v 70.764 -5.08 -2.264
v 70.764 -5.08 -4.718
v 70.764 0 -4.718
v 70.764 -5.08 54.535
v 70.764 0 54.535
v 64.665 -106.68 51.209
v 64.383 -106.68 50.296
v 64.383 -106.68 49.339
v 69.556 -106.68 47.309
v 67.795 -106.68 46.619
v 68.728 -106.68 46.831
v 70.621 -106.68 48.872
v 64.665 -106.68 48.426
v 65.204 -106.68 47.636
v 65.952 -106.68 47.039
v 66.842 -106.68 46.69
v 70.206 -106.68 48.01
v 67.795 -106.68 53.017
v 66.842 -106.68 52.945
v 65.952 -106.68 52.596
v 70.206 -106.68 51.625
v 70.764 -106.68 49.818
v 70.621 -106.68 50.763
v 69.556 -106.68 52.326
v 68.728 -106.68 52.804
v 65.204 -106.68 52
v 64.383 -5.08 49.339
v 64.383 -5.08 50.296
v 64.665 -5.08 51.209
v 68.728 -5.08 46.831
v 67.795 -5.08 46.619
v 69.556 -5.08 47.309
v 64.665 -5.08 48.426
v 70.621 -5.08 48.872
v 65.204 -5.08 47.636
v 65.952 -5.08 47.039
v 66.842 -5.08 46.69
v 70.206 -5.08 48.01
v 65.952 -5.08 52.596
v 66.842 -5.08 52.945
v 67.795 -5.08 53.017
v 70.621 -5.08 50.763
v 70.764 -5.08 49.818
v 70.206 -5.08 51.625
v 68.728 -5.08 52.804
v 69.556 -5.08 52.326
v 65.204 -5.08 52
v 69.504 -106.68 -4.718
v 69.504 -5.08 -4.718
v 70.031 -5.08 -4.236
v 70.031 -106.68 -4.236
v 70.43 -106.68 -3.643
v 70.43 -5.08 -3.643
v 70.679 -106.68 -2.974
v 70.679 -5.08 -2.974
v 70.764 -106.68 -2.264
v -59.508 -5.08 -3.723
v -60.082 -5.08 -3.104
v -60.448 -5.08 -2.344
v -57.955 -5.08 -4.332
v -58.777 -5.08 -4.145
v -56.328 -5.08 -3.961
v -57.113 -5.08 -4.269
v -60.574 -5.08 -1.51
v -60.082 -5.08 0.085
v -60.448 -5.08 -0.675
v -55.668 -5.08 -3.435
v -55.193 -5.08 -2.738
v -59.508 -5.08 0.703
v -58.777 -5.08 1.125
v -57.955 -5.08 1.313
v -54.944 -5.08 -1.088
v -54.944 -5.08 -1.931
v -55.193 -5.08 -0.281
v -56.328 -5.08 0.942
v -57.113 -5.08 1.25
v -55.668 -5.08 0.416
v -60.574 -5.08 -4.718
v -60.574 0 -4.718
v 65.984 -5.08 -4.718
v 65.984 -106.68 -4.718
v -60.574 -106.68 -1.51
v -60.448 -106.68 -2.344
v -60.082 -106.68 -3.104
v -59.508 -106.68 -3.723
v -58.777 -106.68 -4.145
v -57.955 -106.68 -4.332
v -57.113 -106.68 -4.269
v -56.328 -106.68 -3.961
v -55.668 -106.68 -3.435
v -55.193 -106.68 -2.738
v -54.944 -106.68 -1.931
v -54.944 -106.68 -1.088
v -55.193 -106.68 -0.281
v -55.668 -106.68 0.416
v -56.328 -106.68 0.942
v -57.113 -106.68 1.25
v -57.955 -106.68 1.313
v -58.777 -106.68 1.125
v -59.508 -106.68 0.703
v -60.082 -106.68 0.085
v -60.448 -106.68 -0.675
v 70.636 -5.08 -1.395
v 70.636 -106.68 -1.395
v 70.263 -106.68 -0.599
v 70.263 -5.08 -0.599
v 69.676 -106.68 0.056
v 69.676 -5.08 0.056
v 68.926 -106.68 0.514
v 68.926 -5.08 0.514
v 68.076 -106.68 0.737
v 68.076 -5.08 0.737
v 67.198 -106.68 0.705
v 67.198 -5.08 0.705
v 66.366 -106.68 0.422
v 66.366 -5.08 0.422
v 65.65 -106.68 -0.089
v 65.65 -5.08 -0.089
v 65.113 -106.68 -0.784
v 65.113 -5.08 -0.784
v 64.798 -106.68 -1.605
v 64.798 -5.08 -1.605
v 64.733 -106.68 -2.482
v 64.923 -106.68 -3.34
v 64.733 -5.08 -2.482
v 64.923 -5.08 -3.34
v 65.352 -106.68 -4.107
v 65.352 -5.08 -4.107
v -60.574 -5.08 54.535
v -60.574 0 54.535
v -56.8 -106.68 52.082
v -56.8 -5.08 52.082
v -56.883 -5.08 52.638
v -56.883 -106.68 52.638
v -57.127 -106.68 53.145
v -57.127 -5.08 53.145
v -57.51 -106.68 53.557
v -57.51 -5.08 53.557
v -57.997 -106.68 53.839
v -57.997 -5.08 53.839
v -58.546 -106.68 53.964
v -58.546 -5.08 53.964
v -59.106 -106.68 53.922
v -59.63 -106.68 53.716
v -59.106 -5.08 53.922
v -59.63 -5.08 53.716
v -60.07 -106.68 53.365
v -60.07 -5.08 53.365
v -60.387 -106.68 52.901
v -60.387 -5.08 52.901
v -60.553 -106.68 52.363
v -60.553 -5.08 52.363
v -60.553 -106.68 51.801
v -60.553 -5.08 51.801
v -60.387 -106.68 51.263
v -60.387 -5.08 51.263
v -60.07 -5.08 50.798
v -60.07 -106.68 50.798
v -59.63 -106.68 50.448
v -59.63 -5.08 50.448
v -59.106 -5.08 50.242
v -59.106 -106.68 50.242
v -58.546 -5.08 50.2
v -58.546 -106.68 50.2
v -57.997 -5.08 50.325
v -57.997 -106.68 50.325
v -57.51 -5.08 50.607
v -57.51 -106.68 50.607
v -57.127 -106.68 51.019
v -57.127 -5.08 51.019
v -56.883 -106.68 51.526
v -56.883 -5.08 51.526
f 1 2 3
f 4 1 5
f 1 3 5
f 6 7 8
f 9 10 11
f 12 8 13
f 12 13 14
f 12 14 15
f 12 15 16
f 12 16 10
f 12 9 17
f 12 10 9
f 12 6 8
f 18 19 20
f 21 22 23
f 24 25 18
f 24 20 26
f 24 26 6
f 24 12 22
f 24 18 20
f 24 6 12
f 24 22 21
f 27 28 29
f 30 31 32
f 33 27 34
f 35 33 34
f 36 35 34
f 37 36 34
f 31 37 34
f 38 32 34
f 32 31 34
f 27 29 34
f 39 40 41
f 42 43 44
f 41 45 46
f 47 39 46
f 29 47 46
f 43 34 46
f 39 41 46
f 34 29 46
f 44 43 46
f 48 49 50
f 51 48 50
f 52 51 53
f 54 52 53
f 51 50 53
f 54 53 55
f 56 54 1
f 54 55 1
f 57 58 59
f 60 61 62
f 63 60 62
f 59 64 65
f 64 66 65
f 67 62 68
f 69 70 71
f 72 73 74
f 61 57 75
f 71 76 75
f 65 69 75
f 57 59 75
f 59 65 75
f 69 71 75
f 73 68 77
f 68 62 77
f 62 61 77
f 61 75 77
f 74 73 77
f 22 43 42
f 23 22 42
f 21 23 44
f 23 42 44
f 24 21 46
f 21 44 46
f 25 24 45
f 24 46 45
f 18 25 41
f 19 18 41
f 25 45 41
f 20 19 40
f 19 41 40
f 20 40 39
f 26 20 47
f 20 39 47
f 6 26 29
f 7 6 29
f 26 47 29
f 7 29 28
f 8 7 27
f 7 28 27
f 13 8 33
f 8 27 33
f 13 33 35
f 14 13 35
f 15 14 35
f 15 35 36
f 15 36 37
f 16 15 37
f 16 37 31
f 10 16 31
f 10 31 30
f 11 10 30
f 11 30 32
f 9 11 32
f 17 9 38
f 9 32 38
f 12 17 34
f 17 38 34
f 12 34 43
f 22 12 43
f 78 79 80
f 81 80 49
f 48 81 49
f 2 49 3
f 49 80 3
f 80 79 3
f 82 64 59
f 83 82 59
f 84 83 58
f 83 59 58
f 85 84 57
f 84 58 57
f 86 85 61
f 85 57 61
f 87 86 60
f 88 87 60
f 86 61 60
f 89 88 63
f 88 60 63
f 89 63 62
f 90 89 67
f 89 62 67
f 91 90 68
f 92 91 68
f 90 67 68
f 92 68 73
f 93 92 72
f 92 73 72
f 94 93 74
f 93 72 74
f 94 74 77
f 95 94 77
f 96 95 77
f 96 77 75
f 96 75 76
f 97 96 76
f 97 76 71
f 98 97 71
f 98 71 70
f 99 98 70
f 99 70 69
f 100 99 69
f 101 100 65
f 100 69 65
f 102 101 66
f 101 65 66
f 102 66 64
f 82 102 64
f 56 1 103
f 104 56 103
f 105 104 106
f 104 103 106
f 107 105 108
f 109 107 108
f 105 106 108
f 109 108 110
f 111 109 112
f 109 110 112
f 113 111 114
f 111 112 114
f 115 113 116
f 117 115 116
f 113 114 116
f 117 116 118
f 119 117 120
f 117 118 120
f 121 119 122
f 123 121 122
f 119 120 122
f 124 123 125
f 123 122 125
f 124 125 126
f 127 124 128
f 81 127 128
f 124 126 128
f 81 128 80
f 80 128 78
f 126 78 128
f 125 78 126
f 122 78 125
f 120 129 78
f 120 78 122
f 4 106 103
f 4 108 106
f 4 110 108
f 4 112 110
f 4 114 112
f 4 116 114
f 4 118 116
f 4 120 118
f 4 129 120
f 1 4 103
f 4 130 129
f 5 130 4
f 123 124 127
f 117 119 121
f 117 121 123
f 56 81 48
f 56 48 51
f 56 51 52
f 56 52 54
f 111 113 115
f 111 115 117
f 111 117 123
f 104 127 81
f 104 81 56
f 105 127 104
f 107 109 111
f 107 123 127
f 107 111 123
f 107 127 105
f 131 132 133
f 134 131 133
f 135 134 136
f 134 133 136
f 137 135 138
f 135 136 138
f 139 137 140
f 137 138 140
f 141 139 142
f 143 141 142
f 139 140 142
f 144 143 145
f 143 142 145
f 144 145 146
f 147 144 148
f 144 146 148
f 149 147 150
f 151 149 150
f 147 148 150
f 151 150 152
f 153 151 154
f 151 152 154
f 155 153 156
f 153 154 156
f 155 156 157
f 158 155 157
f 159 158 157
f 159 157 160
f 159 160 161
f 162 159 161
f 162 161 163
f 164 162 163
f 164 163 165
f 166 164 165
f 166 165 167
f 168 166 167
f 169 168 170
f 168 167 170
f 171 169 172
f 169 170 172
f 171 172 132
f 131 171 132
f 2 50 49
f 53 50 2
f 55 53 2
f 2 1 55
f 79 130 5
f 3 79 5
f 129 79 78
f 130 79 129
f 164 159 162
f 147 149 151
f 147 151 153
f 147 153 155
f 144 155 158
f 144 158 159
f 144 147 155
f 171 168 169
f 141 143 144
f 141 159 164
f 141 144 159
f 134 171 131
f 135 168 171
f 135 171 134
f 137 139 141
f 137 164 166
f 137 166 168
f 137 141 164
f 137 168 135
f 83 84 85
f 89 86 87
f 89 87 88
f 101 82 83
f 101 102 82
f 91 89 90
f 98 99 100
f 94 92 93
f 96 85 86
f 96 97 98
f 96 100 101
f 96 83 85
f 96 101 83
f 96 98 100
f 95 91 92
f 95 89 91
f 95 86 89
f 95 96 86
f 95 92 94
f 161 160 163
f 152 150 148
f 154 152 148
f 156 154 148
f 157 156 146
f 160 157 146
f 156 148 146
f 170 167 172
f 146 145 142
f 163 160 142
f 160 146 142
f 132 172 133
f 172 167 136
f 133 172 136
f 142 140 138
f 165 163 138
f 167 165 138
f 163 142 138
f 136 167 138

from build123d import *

# Parameters (mm, degrees)
F0_W     = 131.3371732831
F0_H     = 59.2526914552
F1_DEPTH = 5.08
F3_DEPTH = 101.6
F2_R     = 3.2079517841


with BuildPart() as f1:
    # F0 (on Front) → F1 (new body)
    with BuildSketch(Plane.XZ):
        with Locations((5.0949789584, 24.908774998)):
            Rectangle(F0_W, F0_H)
    extrude(amount=F1_DEPTH)

    # F2 (on face) → F3, piece 4 (join)
    with BuildSketch(Plane.XZ.offset(5.08)):
        with BuildLine():
            ThreePointArc((70.7635655999, -2.2644340061), (66.3656159776, 0.4216413008), (65.9842222944, -4.7175707296))
            Line((65.9842222944, -4.7175707296), (69.5044219479, -4.7175707296))
            ThreePointArc((69.5044219479, -4.7175707296), (70.430397428, -3.6431401496), (70.7635655999, -2.2644340061))
        make_face()
    extrude(amount=F3_DEPTH)


with BuildPart() as f3:
    # F2 (on face) → F3 (new body)
    with BuildSketch(Plane.XZ.offset(5.08)):
        with BuildLine():
            ThreePointArc((-60.5736076832, 52.0819835365), (-58.6865805089, 50.1949563622), (-56.7995533347, 52.0819835365))
            ThreePointArc((-56.7995533347, 52.0819835365), (-58.6865805089, 53.9690107107), (-60.5736076832, 52.0819835365))
        make_face()
    extrude(amount=F3_DEPTH)


with BuildPart() as f3b:
    # F2 (on face) → F3, piece 2 (new body)
    with BuildSketch(Plane.XZ.offset(5.08)):
        with BuildLine():
            ThreePointArc((-54.9125224352, -1.5096226707), (-57.7430650433, 1.3209199533), (-60.5736076832, -1.509622639))
            ThreePointArc((-60.5736076832, -1.509622639), (-57.7430650751, -4.3401652947), (-54.9125224352, -1.5096226707))
        make_face()
    extrude(amount=F3_DEPTH)


with BuildPart() as f3c:
    # F2 (on face) → F3, piece 3 (new body)
    with BuildSketch(Plane.XZ.offset(5.08)):
        with Locations((67.5556138158, 49.8175472021)):
            Circle(F2_R)
    extrude(amount=F3_DEPTH)


solid = Compound([f1.part, f3.part, f3b.part, f3c.part])
